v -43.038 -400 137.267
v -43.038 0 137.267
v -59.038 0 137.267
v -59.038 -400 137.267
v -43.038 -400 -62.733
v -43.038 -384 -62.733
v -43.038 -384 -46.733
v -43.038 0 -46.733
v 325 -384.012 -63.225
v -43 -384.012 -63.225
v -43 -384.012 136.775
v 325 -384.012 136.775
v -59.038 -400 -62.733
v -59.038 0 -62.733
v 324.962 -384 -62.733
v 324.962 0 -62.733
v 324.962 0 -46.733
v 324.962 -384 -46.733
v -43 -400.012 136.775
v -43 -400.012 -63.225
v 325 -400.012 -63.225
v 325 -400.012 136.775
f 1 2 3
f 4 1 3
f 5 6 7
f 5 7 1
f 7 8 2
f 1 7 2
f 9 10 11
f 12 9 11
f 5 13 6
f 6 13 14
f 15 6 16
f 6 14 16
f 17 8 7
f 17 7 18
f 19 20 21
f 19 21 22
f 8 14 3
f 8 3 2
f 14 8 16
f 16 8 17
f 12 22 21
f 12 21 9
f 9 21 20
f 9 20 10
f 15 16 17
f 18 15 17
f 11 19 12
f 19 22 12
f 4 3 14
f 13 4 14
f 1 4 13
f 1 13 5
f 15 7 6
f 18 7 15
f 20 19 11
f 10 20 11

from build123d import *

# Parameters (mm, degrees)
F0_W          = 368
F0_H          = 16
F1_DEPTH      = 384
F2_DEPTH      = 400
F3_W          = 16
F3_H          = 200
F4_DEPTH      = 325
F4_DEPTH_BACK = 43


with BuildPart() as f1:
    # F0 (on Front) → F1 (new body)
    with BuildSketch(Plane.XZ):
        with Locations((140.962274, -54.733276)):
            Rectangle(F0_W, F0_H)
    extrude(amount=F1_DEPTH)

    # F0 (on Front) → F2 (join)
    with BuildSketch(Plane.XZ):
        Polygon((-43.037726, 137.266724), (-59.037726, 137.266724), (-59.037726, -62.733276), (-43.037726, -62.733276), (-43.037726, -46.733276), align=None)
    extrude(amount=F2_DEPTH)


with BuildPart() as f4:
    # F3 (on Right) → F4 (new body, two sides)
    with BuildSketch(Plane.YZ) as f4_sk:
        with Locations((-392.011985, 36.774969)):
            Rectangle(F3_W, F3_H)
    extrude(amount=F4_DEPTH)
    extrude(f4_sk.sketch, amount=-F4_DEPTH_BACK)


solid = Compound([f1.part, f4.part])
